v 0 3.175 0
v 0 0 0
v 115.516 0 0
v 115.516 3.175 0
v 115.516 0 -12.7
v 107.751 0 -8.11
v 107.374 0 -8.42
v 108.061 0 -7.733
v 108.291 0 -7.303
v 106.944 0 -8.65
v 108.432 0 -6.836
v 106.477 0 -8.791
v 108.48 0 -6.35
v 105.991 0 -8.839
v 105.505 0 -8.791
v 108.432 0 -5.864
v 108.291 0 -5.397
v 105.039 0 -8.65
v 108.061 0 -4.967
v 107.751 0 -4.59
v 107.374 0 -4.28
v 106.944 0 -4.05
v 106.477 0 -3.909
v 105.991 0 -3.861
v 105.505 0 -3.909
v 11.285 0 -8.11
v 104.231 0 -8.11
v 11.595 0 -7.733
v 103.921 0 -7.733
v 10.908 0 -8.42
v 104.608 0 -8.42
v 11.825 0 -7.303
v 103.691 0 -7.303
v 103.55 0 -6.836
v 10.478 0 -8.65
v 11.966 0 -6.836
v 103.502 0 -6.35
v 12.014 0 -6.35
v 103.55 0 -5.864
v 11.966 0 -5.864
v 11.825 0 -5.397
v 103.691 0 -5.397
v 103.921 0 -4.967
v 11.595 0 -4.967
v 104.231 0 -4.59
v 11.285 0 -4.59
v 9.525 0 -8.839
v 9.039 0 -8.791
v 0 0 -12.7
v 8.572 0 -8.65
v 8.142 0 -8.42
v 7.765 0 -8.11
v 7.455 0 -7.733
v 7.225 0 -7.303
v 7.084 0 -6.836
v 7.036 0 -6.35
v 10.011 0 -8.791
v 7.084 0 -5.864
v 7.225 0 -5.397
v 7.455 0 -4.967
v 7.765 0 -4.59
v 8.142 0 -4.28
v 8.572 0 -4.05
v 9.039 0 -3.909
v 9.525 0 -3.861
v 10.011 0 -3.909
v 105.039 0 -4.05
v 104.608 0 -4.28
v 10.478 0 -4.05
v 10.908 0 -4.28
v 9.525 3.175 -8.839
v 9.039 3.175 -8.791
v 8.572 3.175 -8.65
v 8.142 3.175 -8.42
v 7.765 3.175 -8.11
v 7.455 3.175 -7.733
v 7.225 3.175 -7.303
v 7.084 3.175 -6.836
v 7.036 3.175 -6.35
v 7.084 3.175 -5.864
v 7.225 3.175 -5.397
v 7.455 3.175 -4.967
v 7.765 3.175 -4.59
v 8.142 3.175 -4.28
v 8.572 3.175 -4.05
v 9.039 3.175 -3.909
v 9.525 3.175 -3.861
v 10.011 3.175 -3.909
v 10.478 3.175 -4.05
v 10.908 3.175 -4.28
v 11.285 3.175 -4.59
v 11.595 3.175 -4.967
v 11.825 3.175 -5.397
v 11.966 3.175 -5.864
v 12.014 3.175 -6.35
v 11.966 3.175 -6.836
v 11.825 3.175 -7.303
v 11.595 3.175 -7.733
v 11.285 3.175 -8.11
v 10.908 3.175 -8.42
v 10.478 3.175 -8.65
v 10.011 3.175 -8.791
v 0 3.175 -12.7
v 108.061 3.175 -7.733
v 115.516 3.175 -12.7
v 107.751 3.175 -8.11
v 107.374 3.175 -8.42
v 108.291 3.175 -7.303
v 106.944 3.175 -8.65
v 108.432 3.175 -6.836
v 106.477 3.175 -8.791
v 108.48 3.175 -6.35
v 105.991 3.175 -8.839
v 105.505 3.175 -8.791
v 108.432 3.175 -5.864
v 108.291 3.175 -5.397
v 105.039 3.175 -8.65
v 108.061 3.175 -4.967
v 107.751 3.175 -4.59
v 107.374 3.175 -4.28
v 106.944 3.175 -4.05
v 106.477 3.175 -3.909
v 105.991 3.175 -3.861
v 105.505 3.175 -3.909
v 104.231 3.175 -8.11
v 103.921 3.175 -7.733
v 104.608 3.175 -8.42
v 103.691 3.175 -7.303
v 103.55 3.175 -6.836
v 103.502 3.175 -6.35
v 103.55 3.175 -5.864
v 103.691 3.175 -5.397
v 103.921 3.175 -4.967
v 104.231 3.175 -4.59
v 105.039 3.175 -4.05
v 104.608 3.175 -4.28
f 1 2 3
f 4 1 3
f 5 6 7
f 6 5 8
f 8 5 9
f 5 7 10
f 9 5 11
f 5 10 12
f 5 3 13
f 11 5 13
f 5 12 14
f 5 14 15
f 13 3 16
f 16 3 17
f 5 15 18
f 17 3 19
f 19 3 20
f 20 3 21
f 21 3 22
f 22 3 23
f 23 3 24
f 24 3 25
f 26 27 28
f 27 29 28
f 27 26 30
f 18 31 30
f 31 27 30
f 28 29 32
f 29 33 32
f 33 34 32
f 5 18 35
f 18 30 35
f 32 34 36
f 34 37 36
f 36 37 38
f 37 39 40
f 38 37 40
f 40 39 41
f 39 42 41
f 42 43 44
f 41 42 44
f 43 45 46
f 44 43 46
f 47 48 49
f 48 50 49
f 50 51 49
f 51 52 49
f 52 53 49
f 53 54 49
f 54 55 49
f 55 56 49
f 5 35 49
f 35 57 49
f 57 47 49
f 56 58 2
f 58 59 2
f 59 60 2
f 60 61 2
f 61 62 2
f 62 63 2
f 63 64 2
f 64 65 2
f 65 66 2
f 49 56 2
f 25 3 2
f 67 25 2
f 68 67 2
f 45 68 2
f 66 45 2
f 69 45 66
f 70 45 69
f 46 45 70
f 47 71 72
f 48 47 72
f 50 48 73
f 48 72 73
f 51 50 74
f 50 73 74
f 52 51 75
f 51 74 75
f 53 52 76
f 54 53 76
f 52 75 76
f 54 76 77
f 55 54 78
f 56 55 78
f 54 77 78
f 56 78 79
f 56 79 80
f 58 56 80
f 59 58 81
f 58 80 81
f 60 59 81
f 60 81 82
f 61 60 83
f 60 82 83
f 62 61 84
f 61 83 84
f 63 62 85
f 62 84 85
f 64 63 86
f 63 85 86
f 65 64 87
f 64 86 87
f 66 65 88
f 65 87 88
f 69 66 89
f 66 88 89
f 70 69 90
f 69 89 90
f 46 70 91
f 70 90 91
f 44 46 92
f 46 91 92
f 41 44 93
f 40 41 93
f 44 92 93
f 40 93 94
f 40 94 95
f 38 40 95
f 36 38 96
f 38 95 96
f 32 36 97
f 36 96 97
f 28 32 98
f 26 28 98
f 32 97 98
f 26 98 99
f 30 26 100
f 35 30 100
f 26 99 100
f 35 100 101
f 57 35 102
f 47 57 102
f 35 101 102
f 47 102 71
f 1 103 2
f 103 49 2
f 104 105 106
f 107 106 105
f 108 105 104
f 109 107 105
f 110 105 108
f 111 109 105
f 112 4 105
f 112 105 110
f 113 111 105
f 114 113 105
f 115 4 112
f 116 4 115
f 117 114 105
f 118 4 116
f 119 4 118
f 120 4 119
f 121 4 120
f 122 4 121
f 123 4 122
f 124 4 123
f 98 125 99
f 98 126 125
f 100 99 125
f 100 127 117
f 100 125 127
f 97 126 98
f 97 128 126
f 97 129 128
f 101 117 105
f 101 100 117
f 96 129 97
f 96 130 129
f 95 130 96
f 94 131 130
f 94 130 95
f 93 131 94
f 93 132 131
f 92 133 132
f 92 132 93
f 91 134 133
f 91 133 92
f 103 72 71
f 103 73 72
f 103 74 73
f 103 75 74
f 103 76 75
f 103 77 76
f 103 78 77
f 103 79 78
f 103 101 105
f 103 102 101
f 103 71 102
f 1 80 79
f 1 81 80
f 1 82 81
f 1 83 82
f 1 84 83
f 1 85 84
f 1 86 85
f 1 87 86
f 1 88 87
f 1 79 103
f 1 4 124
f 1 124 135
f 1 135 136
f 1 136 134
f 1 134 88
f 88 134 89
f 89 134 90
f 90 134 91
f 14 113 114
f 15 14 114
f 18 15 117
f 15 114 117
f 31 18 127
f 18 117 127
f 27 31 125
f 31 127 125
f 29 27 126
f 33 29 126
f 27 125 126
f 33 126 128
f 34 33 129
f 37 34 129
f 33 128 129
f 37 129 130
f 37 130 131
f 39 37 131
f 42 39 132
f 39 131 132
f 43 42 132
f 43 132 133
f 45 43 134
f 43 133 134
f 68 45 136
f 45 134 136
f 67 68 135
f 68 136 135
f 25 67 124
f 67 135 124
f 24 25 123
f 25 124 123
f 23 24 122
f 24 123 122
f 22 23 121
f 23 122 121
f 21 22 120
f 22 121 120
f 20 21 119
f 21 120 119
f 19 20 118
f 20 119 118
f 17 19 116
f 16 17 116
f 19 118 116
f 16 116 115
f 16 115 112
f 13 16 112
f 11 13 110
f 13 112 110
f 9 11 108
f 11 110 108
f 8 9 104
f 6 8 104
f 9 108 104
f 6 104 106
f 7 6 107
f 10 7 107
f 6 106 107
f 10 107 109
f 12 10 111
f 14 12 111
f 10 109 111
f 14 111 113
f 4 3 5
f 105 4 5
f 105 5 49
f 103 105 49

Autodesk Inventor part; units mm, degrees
ref_plane "YZ Plane" through (0, 0, 0) normal (1, 0, 0) x (0, 1, 0)
ref_plane "XZ Plane" through (0, 0, 0) normal (0, 1, 0) x (-1, 0, 0)
ref_plane "XY Plane" through (0, 0, 0) normal (0, 0, 1) x (1, 0, 0)
sketch "Sketch2" plane through (0, 0, 0) normal (0, 1, 0) x (-1, 0, 0)
  line L0 (0, 0) -> (-115.5161, 0)
  line L1 (-115.5161, 0) -> (-115.5161, -12.7)
  line L2 (-115.5161, -12.7) -> (0, -12.7)
  line L3 (0, -12.7) -> (0, 0)
  line L4 (0, -6.35) -> (-115.5161, -6.35)
  point P0 (-9.525, -6.35)
  point P1 (-105.9911, -6.35)
  dimension "d12" = 12.7
  dimension "d13" = 9.525
  dimension "d14" = 9.525
  dimension "d15" = 96.4661
extrude "Extrusion2" add sketch "Sketch2" along normal blind 3.175
hole "Hole2" at (9.525, 0, -6.35) at (105.9911, 0, -6.35) direction (0, 1, 0) diameter 4.9784 end through all clearance for "Flat Head Machine Screw (82)" size "#10" standard "Ansi Unified Screw Threads"
equation "\"d15\" = ringDiam"
equation "\"height\" = 203.2"
equation "\"thickness\" = 12.7"
equation "\"shaftDiam\" = 6.35"
equation "\"shaftSpace\" = 1.5875"
equation "\"stageSpace\" = 2.54"
equation "\"stageAngle\" = 15deg"
equation "\"bearingDiam\" = 9.5504"
equation "\"FlangeDiam\" = 12.7"
equation "\"FlangeDepth\" = 1.5875"
equation "\"smallFilet\" = 0.39687"
equation "\"ringDiam\" = 96.46608"
equation "\"stockHeight\" = 50.8"
equation "\"stockWidth\" = 76.2"
equation "\"stockRad\" = 9.525"
equation "\"stockGuage\" = 3.175"
equation "\"groundActu\" = 304.8"
equation "\"baseWidth\" = 1066.8"
equation "\"baseDepth\" = 254"
equation "\"capThickness\" = 3.175"
equation "\"sup1Len\" = 660.4"
equation "\"sup1Ang\" = 22.619865deg"
equation "\"sup2Len\" = 2079.37366"
equation "\"sup2Ang\" = 8.959949deg"
equation "\"supVertLen\" = 955.13561"
equation "\"supSideLen\" = 1531.12879"
equation "\"supSideAng\" = 19.376933deg"
properties part number "lock ring 1 supp" material "Aluminum 6061"
